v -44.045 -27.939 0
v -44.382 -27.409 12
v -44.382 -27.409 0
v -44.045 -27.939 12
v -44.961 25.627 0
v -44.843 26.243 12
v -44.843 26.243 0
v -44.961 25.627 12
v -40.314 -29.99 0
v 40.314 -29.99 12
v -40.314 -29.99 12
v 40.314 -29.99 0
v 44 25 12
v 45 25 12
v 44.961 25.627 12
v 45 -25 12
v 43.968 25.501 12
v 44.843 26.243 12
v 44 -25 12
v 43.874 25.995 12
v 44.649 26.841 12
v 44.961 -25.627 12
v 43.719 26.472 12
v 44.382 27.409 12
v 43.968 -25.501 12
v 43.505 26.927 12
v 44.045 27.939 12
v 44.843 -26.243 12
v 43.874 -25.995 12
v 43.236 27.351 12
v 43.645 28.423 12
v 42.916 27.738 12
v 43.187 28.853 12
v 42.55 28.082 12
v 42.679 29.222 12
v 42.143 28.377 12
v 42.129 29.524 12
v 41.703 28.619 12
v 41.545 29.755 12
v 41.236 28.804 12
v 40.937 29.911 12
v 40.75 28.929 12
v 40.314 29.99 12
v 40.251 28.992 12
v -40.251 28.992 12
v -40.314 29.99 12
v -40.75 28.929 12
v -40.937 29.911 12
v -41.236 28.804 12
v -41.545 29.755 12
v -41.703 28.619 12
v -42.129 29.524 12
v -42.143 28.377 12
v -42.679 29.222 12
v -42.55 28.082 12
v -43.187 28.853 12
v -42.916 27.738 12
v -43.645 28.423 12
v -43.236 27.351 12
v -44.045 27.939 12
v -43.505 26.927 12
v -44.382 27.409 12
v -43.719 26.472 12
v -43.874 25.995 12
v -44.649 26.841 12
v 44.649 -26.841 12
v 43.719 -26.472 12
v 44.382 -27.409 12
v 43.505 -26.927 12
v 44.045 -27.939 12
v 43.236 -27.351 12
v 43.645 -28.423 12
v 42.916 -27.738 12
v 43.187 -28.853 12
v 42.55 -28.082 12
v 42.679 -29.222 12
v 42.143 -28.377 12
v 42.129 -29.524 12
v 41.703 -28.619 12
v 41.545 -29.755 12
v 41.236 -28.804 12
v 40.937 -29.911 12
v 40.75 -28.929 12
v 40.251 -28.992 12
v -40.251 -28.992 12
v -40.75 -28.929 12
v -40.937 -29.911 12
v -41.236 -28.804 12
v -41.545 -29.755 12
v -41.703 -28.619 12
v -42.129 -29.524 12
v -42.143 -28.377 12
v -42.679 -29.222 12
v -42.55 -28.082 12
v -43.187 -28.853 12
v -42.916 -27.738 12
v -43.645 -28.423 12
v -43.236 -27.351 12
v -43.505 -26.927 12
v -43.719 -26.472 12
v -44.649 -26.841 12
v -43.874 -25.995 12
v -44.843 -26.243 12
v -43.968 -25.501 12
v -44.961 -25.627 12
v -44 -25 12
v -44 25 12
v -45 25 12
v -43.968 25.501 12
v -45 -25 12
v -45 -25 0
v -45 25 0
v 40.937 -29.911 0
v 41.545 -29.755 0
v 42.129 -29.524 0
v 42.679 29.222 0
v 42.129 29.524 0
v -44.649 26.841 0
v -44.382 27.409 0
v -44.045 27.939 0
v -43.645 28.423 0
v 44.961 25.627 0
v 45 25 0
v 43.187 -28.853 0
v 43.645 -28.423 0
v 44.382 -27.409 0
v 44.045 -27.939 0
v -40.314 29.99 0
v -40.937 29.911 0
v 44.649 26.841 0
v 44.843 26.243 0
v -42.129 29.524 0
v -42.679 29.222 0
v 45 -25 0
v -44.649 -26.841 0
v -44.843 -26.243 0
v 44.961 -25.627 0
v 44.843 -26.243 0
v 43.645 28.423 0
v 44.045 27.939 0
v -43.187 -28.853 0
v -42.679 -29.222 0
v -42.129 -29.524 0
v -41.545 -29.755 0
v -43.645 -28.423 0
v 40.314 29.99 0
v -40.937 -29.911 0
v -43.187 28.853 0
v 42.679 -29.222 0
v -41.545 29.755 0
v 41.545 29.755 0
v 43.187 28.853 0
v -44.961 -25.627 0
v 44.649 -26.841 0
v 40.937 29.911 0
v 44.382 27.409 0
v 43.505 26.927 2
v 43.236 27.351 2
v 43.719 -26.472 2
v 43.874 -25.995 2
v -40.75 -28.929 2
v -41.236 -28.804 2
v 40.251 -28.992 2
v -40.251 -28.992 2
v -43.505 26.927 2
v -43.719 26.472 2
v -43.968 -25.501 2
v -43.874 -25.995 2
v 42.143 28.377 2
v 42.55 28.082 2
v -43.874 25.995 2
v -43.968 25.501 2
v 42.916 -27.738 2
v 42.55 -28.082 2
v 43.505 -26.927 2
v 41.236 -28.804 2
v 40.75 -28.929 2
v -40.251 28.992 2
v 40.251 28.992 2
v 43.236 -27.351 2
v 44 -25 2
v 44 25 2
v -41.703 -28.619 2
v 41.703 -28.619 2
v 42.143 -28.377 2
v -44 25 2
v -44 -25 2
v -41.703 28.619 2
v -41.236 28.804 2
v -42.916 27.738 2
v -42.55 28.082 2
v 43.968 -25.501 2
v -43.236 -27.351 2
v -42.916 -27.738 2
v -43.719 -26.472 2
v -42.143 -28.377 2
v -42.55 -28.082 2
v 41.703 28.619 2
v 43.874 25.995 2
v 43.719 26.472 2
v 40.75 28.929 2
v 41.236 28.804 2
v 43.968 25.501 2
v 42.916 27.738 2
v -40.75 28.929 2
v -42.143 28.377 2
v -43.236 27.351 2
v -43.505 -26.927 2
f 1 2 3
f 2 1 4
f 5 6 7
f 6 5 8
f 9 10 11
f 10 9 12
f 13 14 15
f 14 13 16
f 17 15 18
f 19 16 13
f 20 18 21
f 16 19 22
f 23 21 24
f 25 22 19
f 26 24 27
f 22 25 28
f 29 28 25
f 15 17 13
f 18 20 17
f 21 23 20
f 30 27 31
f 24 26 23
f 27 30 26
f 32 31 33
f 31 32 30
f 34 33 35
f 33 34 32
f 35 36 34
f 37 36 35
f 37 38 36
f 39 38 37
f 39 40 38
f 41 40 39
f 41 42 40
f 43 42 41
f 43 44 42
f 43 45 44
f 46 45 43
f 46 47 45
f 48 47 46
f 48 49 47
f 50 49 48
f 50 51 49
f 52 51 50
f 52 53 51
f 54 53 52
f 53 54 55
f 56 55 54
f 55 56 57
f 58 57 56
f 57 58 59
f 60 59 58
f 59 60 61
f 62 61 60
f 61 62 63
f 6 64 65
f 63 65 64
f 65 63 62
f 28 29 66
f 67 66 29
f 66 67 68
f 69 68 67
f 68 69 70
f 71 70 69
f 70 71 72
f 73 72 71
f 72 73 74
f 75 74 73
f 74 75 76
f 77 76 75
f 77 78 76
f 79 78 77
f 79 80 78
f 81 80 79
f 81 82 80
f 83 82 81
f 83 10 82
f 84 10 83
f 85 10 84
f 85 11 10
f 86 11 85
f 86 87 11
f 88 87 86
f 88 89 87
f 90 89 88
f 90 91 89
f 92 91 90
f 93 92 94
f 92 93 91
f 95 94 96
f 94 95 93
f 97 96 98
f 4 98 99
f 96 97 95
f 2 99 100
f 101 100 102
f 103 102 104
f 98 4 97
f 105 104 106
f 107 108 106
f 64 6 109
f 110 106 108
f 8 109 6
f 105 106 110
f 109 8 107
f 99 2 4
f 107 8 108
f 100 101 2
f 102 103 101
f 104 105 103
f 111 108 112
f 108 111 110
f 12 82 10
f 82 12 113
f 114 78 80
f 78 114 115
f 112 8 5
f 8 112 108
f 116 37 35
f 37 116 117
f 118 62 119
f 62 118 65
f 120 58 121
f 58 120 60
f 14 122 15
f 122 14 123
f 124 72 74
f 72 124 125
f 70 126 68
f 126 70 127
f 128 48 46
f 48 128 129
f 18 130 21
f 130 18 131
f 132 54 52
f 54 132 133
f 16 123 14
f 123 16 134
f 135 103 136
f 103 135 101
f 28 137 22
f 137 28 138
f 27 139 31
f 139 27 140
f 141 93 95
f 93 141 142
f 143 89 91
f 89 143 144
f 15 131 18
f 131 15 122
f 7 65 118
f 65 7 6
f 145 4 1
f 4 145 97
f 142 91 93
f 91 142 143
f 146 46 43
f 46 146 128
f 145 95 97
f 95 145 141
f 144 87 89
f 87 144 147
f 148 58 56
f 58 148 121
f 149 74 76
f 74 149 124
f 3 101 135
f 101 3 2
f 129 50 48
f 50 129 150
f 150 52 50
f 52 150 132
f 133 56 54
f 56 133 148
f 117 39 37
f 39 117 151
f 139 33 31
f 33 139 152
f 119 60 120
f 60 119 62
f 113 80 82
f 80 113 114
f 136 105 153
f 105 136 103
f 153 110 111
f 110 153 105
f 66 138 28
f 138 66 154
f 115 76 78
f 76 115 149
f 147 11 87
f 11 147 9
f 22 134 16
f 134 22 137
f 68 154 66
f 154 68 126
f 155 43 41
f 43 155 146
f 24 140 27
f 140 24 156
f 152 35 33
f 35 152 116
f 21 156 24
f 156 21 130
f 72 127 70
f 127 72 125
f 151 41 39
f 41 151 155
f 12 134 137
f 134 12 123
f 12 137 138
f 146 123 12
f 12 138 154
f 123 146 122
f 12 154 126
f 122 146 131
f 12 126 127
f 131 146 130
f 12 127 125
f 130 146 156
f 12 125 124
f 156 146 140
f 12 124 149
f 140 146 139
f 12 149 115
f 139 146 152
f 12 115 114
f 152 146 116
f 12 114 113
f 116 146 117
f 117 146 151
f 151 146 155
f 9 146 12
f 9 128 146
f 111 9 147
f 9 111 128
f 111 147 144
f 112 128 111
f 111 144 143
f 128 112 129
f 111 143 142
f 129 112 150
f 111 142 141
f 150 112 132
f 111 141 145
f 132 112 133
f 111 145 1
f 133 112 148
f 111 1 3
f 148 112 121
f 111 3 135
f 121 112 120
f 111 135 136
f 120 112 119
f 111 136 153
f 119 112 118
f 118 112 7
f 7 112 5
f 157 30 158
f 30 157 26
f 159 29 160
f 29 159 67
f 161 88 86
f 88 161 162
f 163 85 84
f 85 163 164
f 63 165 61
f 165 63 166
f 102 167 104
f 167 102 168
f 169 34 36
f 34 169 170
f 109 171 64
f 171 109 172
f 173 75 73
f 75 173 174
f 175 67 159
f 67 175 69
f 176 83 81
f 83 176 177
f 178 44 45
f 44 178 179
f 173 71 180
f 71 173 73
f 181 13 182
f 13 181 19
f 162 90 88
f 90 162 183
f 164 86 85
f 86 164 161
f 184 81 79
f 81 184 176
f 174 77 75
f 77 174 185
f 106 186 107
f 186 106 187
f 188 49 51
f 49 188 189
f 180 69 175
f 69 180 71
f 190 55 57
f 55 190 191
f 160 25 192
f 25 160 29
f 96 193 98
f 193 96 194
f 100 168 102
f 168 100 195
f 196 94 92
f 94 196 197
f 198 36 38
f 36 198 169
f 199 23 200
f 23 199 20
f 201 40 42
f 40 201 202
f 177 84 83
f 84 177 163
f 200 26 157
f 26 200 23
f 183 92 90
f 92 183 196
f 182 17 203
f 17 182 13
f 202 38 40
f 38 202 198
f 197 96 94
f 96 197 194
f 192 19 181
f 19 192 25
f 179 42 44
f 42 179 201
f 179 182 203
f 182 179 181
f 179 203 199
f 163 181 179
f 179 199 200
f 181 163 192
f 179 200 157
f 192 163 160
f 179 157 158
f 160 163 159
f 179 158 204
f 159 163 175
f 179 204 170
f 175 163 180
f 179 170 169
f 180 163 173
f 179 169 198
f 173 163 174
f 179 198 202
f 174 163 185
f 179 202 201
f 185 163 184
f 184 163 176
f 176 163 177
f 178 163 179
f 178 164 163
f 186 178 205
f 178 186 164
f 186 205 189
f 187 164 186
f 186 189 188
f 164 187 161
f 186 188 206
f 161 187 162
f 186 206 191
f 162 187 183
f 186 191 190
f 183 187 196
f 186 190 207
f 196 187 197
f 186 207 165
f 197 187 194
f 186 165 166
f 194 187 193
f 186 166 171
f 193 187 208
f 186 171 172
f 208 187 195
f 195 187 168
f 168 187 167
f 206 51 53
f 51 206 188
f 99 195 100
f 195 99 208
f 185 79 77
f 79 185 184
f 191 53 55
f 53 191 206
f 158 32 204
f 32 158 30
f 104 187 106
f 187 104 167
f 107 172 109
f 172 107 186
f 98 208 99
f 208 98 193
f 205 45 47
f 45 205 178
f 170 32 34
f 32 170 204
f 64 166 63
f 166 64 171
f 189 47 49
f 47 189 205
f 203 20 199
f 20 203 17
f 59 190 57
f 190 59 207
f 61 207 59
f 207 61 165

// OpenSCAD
$fn = 50;


difference() {
	union() {
		hull() {
			translate(v = [-40.0000000000, 25.0000000000, 0]) {
				cylinder(h = 12, r = 5);
			}
			translate(v = [40.0000000000, 25.0000000000, 0]) {
				cylinder(h = 12, r = 5);
			}
			translate(v = [-40.0000000000, -25.0000000000, 0]) {
				cylinder(h = 12, r = 5);
			}
			translate(v = [40.0000000000, -25.0000000000, 0]) {
				cylinder(h = 12, r = 5);
			}
		}
	}
	union() {
		translate(v = [0, 0, 2]) {
			hull() {
				translate(v = [-40.0000000000, 25.0000000000, 0]) {
					cylinder(h = 10, r = 4);
				}
				translate(v = [40.0000000000, 25.0000000000, 0]) {
					cylinder(h = 10, r = 4);
				}
				translate(v = [-40.0000000000, -25.0000000000, 0]) {
					cylinder(h = 10, r = 4);
				}
				translate(v = [40.0000000000, -25.0000000000, 0]) {
					cylinder(h = 10, r = 4);
				}
			}
		}
	}
}
